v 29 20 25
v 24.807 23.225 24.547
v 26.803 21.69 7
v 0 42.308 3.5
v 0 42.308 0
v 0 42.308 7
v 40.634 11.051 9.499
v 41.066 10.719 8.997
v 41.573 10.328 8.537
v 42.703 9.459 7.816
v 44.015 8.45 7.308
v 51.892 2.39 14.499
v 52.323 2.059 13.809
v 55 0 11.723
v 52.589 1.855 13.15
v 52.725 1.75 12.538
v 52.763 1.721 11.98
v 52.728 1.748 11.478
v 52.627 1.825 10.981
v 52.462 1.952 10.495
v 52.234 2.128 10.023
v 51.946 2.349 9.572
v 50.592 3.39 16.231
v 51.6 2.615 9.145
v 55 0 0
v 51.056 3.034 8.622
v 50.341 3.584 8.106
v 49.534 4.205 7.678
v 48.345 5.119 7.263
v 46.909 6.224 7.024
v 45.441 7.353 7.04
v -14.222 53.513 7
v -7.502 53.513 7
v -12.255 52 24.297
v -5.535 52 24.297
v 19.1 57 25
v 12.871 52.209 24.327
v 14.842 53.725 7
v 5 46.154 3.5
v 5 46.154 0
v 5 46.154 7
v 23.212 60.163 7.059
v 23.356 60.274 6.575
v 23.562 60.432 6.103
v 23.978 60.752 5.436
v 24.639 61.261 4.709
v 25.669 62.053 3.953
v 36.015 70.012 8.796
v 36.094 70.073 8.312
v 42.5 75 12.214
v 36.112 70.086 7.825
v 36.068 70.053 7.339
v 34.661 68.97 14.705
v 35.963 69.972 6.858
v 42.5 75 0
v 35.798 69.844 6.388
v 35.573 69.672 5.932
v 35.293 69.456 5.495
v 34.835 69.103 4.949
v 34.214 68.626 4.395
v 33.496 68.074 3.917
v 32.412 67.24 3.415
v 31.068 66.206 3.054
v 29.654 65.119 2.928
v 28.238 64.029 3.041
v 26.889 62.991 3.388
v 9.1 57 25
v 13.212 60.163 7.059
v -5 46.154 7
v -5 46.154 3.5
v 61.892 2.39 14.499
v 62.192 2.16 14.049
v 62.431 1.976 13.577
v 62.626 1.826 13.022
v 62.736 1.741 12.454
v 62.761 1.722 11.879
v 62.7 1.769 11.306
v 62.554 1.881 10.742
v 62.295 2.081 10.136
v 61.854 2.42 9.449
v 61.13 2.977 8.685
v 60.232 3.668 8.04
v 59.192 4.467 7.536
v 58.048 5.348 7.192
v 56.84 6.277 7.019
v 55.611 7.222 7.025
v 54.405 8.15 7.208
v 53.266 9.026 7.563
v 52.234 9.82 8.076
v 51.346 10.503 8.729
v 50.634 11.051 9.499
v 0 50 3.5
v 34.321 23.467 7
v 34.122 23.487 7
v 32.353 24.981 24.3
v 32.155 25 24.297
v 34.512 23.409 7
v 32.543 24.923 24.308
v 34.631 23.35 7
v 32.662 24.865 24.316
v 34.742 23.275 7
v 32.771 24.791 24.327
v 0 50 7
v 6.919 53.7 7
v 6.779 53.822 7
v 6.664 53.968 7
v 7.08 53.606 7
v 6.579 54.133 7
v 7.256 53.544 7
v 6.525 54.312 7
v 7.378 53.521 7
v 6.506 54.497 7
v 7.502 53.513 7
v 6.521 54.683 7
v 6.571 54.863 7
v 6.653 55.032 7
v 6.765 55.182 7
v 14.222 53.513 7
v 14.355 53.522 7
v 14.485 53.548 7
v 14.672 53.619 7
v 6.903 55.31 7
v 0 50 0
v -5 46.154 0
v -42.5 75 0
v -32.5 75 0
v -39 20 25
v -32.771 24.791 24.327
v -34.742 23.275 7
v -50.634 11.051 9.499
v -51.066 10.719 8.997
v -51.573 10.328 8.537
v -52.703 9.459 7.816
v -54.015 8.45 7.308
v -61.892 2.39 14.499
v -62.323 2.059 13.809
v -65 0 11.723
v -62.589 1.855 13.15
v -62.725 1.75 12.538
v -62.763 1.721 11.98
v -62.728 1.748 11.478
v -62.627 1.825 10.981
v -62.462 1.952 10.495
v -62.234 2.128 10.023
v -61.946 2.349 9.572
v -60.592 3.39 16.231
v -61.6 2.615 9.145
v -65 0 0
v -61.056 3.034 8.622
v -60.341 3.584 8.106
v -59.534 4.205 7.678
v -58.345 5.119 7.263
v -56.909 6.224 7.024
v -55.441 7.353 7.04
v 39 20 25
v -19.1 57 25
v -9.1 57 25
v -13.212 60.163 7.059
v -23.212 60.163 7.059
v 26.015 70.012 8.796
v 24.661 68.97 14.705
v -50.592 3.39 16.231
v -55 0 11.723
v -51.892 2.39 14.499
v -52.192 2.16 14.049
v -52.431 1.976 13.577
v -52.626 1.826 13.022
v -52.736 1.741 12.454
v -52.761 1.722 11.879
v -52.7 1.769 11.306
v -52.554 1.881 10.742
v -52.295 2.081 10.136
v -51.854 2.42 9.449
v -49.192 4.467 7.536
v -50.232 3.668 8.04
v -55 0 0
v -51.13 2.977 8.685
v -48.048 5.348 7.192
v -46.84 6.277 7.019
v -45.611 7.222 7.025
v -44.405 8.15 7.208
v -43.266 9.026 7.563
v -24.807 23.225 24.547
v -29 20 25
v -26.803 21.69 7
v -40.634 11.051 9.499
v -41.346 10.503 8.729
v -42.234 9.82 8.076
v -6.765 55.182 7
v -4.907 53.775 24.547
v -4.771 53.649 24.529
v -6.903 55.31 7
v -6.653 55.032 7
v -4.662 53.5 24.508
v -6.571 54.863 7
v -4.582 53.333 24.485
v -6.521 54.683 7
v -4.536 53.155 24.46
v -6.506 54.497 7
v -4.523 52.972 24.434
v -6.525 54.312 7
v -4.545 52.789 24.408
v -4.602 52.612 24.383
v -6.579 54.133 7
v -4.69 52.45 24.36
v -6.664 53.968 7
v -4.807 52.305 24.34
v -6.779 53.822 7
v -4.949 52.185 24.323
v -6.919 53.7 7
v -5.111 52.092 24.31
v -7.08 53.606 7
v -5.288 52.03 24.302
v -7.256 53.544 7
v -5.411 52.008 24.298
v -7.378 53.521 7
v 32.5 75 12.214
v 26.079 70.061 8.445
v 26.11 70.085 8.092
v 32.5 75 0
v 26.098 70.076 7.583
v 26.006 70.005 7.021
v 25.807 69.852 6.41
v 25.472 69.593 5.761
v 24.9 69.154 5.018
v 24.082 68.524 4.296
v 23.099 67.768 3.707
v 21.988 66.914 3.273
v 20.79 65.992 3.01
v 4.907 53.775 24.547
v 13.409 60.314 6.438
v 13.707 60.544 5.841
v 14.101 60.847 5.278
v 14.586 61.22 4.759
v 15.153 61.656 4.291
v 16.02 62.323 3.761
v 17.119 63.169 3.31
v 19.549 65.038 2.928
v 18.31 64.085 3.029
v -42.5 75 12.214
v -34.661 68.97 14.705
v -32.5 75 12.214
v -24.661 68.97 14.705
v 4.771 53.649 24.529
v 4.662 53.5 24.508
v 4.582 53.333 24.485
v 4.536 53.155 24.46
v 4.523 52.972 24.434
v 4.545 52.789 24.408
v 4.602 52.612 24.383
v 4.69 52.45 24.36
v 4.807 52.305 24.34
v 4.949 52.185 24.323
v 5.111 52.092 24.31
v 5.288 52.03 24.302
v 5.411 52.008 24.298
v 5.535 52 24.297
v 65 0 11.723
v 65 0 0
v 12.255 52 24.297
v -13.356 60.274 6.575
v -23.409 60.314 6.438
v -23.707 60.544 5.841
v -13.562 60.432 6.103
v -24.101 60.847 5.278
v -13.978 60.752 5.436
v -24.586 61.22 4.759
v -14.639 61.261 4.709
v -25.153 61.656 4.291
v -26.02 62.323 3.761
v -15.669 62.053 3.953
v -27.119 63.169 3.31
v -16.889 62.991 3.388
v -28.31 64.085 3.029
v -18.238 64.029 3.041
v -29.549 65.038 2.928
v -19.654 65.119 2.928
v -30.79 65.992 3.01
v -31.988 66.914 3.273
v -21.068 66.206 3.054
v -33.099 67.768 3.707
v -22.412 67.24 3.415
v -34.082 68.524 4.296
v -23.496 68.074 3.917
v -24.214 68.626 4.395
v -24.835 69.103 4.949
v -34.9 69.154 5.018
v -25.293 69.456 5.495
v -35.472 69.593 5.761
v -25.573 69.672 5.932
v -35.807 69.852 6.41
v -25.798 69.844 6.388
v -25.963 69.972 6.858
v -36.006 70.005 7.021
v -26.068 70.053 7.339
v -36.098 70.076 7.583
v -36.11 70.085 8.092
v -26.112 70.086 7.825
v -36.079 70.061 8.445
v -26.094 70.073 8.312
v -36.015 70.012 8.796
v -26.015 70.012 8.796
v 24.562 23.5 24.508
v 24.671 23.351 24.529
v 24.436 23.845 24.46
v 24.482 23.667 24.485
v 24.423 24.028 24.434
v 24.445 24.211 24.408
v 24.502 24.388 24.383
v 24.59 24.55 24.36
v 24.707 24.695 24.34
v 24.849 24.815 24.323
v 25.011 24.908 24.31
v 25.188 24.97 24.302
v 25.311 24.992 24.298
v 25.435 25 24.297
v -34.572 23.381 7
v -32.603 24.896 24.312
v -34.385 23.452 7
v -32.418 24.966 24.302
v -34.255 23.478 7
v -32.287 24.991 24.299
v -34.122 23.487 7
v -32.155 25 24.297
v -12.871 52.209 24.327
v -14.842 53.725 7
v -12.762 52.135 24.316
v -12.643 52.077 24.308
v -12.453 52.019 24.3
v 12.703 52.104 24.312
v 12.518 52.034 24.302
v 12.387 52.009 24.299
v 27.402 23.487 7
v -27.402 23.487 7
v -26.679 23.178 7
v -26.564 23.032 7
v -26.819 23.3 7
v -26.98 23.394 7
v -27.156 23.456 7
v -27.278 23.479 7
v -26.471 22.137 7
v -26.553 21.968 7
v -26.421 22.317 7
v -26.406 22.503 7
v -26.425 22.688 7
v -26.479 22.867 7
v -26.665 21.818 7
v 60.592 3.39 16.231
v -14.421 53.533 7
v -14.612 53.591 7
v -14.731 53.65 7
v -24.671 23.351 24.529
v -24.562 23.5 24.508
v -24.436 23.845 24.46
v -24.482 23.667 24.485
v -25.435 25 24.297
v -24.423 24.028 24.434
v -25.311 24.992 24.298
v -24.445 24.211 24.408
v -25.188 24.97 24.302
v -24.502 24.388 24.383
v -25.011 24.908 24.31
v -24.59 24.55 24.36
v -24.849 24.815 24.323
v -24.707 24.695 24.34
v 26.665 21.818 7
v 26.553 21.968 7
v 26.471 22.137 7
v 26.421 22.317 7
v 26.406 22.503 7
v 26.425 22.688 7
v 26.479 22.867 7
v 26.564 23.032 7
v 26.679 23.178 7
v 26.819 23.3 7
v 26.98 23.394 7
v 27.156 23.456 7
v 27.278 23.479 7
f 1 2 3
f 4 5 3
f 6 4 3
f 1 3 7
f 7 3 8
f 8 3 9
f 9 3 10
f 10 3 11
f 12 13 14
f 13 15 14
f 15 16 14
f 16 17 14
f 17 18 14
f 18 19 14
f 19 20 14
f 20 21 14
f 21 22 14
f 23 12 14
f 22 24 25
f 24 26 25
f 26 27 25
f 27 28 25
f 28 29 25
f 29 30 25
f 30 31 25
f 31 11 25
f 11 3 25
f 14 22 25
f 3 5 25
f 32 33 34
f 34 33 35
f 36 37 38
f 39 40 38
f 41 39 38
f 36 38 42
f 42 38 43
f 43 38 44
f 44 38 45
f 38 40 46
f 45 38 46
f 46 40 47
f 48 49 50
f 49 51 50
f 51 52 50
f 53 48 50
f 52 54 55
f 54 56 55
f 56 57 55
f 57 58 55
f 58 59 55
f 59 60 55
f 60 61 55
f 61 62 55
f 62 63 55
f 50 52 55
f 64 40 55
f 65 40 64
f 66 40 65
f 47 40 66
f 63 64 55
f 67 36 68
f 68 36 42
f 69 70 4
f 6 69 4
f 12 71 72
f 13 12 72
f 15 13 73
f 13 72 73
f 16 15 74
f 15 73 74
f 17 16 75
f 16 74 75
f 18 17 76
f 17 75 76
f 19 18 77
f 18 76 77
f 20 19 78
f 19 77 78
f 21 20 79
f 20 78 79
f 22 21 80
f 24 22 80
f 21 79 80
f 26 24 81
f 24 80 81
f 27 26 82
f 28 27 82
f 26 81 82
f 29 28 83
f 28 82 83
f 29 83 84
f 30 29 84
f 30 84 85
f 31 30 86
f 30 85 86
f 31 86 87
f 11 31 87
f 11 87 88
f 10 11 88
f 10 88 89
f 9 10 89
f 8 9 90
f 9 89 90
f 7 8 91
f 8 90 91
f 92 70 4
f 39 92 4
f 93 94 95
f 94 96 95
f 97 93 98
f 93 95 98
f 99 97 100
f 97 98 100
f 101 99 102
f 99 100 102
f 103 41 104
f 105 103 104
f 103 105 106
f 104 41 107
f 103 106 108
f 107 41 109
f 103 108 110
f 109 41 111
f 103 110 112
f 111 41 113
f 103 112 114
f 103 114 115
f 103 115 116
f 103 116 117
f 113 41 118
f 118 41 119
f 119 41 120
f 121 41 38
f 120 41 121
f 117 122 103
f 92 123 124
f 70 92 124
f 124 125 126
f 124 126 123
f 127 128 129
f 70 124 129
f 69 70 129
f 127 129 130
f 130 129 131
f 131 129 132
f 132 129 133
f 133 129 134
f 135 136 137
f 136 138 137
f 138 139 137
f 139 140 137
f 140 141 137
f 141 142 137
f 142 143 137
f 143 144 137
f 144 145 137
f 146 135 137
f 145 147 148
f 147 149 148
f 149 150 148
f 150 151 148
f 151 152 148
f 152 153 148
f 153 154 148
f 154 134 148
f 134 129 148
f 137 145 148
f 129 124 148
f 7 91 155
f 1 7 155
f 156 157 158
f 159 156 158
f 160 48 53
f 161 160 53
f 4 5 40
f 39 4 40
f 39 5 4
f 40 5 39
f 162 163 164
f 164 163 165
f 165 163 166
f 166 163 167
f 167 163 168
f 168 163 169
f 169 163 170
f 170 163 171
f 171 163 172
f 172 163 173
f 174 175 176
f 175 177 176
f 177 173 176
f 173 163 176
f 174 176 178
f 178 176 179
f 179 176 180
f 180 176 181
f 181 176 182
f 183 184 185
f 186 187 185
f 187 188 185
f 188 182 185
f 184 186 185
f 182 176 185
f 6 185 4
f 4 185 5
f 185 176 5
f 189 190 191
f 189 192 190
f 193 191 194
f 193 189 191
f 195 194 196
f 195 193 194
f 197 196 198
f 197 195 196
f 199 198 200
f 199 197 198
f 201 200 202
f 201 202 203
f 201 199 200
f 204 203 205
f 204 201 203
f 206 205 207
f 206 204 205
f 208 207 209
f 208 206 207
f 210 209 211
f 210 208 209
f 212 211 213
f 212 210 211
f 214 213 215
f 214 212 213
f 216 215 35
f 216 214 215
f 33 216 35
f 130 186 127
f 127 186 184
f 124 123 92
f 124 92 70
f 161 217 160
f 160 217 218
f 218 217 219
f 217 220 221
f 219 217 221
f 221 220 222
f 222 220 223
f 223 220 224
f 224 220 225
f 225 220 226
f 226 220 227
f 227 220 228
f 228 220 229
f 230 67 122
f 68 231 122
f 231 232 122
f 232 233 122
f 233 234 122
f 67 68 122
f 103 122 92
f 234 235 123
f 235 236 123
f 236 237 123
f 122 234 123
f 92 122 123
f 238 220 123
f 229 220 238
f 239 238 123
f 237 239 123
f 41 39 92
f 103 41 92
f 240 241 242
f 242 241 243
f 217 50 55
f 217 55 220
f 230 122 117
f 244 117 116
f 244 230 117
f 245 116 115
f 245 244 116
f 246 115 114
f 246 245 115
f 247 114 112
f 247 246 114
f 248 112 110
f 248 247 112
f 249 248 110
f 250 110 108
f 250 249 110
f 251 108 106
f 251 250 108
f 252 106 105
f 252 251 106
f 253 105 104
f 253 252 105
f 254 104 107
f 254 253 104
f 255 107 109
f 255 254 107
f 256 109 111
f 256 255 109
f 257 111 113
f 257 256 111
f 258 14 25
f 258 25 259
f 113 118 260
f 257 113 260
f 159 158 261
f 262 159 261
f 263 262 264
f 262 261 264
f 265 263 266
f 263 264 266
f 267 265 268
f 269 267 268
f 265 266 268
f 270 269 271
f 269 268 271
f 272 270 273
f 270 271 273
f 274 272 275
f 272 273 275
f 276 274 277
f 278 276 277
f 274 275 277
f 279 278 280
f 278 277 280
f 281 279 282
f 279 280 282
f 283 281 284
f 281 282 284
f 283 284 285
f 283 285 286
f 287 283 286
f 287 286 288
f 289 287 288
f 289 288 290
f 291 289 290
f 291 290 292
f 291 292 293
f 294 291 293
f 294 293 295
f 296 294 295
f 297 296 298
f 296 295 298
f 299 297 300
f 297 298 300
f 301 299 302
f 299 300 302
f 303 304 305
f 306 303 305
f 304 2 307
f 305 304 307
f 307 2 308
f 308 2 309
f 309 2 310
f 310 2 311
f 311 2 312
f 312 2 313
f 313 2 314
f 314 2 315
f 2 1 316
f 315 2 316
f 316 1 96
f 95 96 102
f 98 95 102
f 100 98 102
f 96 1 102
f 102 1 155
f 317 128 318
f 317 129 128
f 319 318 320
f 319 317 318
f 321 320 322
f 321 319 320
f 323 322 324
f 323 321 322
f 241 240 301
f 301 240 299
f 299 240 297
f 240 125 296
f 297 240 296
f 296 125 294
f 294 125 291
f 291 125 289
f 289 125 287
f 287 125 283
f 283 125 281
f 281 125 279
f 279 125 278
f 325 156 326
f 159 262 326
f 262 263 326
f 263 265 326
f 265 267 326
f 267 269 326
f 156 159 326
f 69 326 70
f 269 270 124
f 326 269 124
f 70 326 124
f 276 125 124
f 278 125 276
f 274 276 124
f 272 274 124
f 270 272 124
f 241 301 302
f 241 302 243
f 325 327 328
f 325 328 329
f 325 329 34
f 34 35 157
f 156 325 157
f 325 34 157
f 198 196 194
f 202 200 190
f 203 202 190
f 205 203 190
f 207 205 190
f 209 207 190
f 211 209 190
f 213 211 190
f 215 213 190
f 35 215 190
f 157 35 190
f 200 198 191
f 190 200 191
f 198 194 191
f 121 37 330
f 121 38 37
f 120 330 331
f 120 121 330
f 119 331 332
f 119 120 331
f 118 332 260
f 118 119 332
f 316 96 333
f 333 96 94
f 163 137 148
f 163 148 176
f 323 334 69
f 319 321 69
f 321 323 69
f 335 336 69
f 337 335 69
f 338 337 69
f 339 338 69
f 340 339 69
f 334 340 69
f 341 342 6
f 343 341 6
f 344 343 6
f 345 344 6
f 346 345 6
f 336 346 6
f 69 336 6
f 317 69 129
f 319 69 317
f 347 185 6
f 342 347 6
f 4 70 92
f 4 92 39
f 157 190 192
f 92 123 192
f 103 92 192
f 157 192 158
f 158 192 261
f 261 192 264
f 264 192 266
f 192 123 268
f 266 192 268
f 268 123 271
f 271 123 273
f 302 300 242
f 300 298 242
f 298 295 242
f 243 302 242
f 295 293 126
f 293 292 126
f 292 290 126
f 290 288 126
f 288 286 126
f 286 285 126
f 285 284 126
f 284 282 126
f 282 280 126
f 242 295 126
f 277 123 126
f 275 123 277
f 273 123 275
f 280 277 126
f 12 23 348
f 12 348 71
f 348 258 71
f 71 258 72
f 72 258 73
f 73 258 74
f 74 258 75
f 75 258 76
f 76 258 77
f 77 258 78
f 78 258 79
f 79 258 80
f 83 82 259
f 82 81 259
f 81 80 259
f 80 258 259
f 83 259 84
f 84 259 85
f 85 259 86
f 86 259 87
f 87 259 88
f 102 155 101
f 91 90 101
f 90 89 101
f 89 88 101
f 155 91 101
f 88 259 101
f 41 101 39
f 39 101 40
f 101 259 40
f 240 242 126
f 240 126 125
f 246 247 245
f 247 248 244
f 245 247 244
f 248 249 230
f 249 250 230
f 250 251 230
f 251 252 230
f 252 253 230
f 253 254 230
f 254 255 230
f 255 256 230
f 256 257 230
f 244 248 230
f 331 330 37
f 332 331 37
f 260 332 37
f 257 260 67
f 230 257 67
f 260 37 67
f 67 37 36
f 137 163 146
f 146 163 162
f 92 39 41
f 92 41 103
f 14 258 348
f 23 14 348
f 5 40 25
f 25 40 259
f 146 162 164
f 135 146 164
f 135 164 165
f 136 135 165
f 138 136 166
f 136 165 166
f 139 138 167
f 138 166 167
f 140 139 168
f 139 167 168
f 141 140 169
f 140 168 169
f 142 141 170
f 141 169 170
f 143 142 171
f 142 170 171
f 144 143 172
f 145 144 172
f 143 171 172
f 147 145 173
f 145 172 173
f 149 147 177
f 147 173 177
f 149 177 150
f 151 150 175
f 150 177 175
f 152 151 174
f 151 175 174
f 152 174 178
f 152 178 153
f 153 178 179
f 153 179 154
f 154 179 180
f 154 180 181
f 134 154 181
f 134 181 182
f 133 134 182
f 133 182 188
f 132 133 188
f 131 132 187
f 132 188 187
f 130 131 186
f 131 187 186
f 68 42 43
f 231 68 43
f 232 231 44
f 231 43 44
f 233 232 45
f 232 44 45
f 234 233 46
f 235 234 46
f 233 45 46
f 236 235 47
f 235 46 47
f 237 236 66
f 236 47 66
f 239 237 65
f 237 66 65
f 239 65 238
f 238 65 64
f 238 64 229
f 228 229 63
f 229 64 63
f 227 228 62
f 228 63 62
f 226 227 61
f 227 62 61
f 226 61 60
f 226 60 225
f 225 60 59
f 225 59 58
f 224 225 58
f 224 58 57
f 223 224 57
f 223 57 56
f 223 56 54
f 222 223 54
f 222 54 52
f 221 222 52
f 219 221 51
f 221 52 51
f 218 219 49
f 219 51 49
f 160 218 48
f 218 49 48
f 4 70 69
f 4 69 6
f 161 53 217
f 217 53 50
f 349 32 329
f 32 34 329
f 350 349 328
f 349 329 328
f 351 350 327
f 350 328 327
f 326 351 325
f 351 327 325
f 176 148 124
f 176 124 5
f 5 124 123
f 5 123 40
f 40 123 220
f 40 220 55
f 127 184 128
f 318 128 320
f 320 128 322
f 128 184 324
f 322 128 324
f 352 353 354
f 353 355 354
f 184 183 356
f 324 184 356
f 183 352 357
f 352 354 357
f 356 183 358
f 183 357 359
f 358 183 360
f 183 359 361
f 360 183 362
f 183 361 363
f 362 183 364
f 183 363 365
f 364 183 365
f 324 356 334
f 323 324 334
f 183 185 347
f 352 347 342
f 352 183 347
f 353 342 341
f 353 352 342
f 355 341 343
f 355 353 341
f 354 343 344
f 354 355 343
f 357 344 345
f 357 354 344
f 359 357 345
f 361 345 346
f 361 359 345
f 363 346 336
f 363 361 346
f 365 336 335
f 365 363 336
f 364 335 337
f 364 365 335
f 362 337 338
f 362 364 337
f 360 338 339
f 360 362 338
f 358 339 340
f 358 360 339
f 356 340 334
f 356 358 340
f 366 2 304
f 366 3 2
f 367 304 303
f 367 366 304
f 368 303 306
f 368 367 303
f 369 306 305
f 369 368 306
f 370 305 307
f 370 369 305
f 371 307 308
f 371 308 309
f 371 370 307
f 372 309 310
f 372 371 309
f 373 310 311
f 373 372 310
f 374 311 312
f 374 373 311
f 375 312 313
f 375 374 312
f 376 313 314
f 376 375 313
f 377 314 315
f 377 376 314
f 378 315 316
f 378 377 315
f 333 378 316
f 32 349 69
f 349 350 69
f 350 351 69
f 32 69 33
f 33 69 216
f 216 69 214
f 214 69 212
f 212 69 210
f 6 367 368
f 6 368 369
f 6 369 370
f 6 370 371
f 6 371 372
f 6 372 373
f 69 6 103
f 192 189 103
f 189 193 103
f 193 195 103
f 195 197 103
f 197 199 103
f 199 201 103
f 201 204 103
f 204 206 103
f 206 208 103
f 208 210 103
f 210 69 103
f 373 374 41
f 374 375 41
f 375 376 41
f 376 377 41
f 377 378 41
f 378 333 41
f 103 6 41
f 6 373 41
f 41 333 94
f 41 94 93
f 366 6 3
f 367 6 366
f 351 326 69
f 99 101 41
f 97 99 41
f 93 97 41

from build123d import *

# Parameters (mm, degrees)
F1_DEPTH      = 25
F2_DEPTH      = 25
F4_DEPTH      = 65.001
F4_DEPTH_BACK = 65.001
F5_DEPTH      = 3.5
F7_R          = 1
F7_2_R        = 1


# Not quite as in the source:
# - a feature of the source that left no trace in its solid (it failed there, or was rolled back) is left out


with BuildPart() as f1:
    # F0 (on Top) → F1 (new body)
    with BuildSketch(Plane.XY):
        Polygon((-65, 0), (-55, 0), (0, 42.3076923077), (-5, 46.1538461538), align=None)
        Polygon((-5, 46.1538461538), (0, 42.3076923077), (5, 46.1538461538), (0, 50), align=None)
        Polygon((0, 50), (5, 46.1538461538), (42.5, 75), (32.5, 75), align=None)
    extrude(amount=F1_DEPTH)


with BuildPart() as f2:
    # F0 (on Top) → F2 (new body)
    with BuildSketch(Plane.XY):
        Polygon((5, 46.1538461538), (0, 42.3076923077), (55, 0), (65, 0), align=None)
        Polygon((-42.5, 75), (-5, 46.1538461538), (0, 50), (-32.5, 75), align=None)
        Polygon((-5, 46.1538461538), (0, 42.3076923077), (5, 46.1538461538), (0, 50), align=None)
    extrude(amount=F2_DEPTH)


with BuildPart() as f4_tool:
    # F3 (on Right) → F4 (new body, two sides)
    with BuildSketch(Plane.YZ) as f4_sk:
        with BuildLine():
            Line((75, 25), (57, 25))
            Line((57, 25), (60.1634270419, 7.0593137296))
            ThreePointArc((60.1634270419, 7.0593137296), (65.9557066953, 3.0035158528), (70.011504572, 8.7957955062))
            Line((70.011504572, 8.7957955062), (68.969615506, 14.7046420243))
            Line((68.969615506, 14.7046420243), (75, 12.2137521295))
            Line((75, 12.2137521295), (75, 25))
        make_face()
        Polygon((57, 25), (20, 25), (25, 24.2972958265), (23.4866827055, 7), (53.5133172945, 7), (52, 24.2972958265), align=None)
        with BuildLine():
            Line((0, 11.7226943725), (3.390477077, 16.2314624079))
            Line((3.390477077, 16.2314624079), (2.390477077, 14.4994116003))
            ThreePointArc((2.390477077, 14.4994116003), (4.2206040959, 7.6692845814), (11.0507311148, 9.4994116003))
            Line((11.0507311148, 9.4994116003), (20, 25))
            Line((20, 25), (0, 25))
            Line((0, 25), (0, 11.7226943725))
        make_face()
    extrude(amount=F4_DEPTH)
    extrude(f4_sk.sketch, amount=-F4_DEPTH_BACK)


with BuildPart() as f1_1:
    add(f1.part)

    # F4: cut by f4_tool
    add(f4_tool.part, mode=Mode.SUBTRACT)


with BuildPart() as f2_1:
    add(f2.part)

    # F4: cut by f4_tool
    add(f4_tool.part, mode=Mode.SUBTRACT)

    # F0 (on Top) → F5 (cut)
    with BuildSketch(Plane.XY):
        Polygon((-5, 46.1538461538), (0, 42.3076923077), (5, 46.1538461538), (0, 50), align=None)
    extrude(amount=F5_DEPTH, mode=Mode.SUBTRACT)


with BuildPart() as f1_2:
    add(f1_1.part)

    # F6: cut F2
    add(f2_1.part, mode=Mode.SUBTRACT)

    # F7
    f7_edges = [f1_2.edges().sort_by_distance(p)[0] for p in [
        (-23.483656, 24.243341, 15.648648),
        (-33.483656, 24.243341, 15.648648),
        (3.583656, 52.756659, 15.648648),
        (13.583656, 52.756659, 15.648648),
    ]]
    fillet(f7_edges, radius=F7_R)


with BuildPart() as f2_2:
    add(f2_1.part)

    # F7#2
    f7_2_edges = [f2_2.edges().sort_by_distance(p)[0] for p in [
        (23.483656, 24.243341, 15.648648),
        (33.483656, 24.243341, 15.648648),
        (-13.583656, 52.756659, 15.648648),
        (-3.583656, 52.756659, 15.648648),
    ]]
    fillet(f7_2_edges, radius=F7_2_R)


solid = Compound([f1_2.part, f2_2.part])
